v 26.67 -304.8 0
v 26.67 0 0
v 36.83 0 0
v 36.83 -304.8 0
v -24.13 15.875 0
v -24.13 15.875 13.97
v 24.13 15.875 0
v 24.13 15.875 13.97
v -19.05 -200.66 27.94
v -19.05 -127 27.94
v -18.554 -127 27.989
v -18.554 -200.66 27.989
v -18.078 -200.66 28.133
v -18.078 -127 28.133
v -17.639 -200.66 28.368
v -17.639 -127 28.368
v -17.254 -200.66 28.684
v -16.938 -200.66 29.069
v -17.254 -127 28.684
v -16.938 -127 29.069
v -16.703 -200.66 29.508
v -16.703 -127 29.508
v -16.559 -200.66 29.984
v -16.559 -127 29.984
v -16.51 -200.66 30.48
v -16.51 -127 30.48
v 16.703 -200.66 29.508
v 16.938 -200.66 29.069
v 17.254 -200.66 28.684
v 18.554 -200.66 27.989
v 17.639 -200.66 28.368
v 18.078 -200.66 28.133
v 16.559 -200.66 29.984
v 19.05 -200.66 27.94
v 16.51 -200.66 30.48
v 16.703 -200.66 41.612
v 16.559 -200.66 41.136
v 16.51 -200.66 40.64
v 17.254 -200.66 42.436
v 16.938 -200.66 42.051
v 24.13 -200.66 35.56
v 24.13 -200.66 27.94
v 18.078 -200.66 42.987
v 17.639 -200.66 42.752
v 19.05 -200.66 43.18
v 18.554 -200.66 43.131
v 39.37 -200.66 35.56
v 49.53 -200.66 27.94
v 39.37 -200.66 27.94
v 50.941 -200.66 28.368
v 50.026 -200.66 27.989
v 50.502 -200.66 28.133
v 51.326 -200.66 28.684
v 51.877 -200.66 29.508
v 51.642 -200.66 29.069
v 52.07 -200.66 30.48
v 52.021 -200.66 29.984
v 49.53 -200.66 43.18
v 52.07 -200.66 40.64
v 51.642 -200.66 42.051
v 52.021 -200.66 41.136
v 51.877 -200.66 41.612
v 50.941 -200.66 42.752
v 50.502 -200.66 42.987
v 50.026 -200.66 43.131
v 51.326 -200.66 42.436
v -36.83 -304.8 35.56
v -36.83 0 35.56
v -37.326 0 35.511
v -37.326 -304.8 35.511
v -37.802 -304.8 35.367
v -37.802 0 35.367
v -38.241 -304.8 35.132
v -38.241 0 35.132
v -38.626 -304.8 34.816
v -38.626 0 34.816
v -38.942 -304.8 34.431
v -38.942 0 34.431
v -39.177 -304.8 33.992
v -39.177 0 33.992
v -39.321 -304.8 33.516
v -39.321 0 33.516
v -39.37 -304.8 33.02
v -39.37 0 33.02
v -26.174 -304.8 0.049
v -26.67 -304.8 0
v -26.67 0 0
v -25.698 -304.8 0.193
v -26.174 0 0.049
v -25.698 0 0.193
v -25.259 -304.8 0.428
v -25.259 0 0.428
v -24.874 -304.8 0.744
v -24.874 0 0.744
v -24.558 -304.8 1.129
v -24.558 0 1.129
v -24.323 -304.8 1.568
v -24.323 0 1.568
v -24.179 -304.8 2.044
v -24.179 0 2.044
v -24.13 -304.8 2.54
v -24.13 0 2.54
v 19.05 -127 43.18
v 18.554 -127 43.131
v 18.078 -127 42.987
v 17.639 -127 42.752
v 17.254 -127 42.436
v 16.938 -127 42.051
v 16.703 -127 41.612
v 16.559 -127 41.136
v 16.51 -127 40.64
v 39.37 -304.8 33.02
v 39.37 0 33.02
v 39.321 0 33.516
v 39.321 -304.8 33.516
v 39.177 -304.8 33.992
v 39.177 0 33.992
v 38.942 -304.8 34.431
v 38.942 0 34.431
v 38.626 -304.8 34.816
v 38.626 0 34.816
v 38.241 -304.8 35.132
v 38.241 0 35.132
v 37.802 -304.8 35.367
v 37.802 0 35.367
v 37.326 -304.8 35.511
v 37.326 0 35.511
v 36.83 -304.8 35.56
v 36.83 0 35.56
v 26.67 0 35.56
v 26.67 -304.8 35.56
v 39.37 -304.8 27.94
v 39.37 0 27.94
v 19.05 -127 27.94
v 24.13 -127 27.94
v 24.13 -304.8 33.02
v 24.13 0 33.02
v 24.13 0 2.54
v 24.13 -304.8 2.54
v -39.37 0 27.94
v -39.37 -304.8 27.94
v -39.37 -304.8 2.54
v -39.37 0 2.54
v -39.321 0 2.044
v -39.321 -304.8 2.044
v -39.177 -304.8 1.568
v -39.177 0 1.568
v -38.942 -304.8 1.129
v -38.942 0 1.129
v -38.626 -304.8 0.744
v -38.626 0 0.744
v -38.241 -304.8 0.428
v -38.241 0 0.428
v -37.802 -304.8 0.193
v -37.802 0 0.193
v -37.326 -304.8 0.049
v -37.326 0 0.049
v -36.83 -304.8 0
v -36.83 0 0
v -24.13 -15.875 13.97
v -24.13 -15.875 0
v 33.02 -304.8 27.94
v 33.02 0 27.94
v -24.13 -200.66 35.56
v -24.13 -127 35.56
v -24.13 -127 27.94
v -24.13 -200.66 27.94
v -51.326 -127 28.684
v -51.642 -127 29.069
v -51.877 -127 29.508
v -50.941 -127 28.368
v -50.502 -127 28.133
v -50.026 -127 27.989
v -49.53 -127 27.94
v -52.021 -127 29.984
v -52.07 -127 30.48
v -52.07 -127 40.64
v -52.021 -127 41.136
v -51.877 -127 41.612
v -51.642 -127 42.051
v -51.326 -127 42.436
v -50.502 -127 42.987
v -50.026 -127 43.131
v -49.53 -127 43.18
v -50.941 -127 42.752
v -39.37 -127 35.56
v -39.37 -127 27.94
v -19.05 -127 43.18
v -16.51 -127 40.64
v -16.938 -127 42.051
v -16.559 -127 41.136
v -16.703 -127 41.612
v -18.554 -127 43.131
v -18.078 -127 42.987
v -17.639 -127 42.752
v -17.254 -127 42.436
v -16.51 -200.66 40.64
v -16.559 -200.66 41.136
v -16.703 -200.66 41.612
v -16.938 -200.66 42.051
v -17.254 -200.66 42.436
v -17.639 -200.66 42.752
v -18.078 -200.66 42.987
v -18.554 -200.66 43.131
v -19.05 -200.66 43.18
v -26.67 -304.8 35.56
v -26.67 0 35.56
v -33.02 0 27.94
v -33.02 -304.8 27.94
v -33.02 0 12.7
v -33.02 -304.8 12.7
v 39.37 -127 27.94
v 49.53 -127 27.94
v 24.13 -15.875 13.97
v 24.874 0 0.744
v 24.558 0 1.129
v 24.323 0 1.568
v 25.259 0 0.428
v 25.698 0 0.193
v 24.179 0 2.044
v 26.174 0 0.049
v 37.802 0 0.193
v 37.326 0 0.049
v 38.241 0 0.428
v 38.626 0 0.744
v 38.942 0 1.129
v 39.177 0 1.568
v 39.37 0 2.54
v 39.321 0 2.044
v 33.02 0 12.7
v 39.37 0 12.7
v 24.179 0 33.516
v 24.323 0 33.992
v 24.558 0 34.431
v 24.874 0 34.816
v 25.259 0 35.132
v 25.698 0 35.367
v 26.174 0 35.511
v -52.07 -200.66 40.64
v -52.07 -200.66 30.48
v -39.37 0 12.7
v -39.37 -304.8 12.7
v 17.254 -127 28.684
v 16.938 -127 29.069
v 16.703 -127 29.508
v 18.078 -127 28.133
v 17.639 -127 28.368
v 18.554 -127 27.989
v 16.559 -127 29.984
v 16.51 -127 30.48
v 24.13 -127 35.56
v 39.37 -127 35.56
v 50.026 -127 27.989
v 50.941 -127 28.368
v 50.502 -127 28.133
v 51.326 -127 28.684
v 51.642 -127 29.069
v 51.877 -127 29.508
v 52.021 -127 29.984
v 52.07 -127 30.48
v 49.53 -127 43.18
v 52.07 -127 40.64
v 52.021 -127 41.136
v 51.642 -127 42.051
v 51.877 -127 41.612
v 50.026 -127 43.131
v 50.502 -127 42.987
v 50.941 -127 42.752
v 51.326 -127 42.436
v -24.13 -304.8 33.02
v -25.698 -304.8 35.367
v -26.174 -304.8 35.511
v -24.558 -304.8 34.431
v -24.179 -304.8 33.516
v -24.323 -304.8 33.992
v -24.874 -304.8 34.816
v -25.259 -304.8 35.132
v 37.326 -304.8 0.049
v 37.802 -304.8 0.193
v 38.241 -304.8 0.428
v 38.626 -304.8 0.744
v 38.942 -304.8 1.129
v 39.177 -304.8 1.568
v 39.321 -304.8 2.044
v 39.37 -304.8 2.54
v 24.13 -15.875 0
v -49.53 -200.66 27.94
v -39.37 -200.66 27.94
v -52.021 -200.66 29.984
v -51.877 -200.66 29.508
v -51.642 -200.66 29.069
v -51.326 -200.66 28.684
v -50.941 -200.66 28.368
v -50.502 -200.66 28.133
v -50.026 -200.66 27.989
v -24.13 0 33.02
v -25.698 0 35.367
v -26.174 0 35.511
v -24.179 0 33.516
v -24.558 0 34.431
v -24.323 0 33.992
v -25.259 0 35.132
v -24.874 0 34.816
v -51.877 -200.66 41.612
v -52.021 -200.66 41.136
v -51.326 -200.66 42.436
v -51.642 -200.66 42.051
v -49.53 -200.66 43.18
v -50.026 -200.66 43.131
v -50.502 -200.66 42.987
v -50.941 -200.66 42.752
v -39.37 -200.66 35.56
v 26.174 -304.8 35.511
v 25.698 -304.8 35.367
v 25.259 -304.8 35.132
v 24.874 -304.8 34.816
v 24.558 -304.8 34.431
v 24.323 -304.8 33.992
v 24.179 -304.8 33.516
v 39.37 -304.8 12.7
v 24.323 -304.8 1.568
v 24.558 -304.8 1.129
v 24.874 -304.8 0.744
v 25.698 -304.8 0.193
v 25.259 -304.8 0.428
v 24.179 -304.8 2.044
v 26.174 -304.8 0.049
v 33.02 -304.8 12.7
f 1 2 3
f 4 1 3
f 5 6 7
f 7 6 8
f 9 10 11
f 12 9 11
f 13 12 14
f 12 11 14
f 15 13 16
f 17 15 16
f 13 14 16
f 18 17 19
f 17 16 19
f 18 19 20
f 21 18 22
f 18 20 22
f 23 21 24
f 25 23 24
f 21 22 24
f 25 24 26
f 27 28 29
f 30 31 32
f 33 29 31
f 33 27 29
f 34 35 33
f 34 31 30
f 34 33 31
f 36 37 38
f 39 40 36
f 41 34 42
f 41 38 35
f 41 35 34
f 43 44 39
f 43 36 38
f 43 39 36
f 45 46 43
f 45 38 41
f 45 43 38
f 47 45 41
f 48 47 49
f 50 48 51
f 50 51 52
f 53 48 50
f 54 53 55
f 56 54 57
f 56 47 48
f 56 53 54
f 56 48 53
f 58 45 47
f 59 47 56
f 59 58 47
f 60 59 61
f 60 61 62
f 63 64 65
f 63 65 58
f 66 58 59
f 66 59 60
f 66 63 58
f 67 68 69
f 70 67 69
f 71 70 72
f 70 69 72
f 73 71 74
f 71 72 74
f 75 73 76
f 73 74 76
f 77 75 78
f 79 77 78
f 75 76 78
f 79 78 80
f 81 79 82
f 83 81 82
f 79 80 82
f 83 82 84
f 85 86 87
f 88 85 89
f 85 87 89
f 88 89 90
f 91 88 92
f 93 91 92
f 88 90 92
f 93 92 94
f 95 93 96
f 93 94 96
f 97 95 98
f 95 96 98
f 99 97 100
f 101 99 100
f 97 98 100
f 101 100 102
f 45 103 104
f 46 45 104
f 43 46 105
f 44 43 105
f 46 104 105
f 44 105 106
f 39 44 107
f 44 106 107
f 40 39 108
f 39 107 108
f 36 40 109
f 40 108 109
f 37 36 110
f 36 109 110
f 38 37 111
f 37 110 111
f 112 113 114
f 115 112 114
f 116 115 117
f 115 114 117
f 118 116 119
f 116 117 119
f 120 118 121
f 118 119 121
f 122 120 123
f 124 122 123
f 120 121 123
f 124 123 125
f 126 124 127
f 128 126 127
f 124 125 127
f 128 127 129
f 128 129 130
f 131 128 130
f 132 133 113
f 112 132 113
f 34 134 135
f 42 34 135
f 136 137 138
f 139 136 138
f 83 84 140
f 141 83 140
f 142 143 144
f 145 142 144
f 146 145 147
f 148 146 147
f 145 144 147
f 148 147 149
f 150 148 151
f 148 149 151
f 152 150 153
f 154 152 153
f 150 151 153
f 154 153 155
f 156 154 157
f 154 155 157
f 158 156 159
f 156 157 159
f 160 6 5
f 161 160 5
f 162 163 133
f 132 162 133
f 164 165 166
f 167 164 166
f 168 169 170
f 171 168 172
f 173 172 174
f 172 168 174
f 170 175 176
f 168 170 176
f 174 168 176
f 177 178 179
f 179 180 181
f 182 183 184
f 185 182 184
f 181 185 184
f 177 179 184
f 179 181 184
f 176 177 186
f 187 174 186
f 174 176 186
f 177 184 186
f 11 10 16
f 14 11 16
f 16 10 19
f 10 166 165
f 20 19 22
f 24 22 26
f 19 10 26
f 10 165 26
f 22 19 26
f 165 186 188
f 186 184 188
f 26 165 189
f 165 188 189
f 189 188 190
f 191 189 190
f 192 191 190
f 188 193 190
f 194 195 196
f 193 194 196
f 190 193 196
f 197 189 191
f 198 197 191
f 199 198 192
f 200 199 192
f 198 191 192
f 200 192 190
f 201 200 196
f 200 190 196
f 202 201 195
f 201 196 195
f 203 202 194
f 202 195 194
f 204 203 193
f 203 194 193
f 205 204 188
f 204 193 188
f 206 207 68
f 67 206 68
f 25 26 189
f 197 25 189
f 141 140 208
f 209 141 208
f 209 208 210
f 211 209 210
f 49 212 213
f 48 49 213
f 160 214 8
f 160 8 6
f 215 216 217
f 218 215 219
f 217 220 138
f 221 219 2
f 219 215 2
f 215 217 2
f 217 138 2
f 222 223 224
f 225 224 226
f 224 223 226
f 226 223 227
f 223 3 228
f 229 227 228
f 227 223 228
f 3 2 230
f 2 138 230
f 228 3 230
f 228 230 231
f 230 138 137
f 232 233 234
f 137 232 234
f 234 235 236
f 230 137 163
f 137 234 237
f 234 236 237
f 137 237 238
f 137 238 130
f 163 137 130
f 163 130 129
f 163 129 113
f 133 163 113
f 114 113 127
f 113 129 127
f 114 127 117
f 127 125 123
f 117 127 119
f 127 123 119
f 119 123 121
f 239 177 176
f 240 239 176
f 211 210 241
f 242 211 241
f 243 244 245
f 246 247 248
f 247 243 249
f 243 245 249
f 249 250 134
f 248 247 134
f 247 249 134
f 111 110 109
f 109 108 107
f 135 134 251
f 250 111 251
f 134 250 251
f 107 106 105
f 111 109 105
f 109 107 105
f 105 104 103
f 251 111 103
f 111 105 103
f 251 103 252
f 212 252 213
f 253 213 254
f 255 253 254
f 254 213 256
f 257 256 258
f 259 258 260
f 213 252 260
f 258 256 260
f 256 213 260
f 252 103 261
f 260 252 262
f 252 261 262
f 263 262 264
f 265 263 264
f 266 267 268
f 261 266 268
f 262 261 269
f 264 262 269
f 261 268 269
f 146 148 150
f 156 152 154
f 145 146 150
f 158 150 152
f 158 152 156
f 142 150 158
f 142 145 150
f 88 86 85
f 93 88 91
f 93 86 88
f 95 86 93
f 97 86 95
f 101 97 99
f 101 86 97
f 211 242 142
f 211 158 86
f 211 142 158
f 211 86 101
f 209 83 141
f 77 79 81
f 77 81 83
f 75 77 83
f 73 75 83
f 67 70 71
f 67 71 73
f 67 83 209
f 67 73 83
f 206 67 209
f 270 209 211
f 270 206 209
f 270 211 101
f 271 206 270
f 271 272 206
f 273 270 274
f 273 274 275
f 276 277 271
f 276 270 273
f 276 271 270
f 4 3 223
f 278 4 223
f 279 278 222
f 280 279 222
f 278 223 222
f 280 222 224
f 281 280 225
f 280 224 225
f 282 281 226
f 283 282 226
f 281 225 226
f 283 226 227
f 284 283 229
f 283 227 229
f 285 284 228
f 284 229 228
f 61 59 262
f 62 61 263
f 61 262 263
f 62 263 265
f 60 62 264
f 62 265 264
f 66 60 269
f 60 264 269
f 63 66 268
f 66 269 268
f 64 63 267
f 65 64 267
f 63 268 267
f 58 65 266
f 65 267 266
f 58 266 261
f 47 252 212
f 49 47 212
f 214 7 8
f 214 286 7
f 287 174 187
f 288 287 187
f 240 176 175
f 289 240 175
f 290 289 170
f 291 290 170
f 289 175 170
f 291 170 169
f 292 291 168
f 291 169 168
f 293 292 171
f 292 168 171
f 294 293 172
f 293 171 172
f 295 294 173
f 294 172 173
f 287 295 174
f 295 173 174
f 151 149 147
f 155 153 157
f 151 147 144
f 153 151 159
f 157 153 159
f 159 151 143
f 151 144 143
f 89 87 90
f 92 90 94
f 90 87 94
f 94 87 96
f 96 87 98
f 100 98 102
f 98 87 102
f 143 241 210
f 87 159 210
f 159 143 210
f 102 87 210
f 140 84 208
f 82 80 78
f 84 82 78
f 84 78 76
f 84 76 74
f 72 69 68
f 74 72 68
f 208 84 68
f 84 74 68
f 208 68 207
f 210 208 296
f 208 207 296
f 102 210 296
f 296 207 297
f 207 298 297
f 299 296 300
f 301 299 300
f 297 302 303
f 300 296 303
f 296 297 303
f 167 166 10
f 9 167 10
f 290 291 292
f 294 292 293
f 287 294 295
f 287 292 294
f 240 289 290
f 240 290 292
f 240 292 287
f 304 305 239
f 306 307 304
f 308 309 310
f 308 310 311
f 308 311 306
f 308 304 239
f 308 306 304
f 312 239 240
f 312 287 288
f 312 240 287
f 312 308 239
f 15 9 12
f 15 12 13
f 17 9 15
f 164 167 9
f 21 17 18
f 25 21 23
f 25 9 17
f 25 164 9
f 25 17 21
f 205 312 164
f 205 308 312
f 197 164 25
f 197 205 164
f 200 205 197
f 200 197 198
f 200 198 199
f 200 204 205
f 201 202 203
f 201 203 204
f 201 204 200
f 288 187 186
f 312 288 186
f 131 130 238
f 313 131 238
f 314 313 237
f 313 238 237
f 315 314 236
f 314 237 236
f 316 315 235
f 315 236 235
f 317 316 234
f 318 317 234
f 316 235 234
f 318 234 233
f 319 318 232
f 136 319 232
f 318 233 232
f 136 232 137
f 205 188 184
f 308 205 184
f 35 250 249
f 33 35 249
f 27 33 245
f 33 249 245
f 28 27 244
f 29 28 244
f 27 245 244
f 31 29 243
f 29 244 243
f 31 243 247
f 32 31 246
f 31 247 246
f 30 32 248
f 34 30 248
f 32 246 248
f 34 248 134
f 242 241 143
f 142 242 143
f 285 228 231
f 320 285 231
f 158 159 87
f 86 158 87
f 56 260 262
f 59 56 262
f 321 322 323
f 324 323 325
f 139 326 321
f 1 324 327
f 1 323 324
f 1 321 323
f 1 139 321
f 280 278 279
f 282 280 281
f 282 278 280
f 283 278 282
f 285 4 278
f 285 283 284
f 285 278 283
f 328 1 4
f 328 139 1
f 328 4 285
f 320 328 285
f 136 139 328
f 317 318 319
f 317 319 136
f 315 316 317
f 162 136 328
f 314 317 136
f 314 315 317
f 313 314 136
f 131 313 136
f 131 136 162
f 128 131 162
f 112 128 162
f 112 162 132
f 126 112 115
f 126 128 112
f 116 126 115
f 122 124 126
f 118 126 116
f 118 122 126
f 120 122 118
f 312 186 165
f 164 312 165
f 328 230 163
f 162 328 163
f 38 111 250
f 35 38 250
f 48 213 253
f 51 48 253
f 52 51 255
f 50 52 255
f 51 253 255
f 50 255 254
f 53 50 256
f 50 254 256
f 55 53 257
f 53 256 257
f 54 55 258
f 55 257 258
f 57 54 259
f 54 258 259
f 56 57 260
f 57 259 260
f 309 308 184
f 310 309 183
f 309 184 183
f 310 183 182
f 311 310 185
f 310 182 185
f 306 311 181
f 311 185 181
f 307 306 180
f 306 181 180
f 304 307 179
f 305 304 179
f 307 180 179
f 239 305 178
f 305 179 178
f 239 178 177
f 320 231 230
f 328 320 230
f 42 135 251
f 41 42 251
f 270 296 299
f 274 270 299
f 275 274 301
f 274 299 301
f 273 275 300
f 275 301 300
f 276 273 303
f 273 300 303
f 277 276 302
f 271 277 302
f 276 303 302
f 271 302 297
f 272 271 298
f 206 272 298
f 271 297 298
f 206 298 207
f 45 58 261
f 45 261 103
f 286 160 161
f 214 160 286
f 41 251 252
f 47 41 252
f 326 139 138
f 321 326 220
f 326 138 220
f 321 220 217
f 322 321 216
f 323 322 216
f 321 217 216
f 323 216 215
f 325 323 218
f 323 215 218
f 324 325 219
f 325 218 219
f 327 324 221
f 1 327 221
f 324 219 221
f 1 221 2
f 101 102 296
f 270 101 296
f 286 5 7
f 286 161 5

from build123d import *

# Parameters (mm, degrees)
F1_DEPTH      = 304.8
F2_START      = 127
F2_DEPTH      = 73.66
F4_DEPTH      = 15.875
F4_DEPTH_BACK = 15.875


with BuildPart() as f1:
    # F0 (on Front) → F1 (new body)
    with BuildSketch(Plane.XZ):
        with BuildLine():
            Line((-24.13, 2.54), (-24.13, 13.97))
            Line((-24.13, 13.97), (-24.13, 27.94))
            Line((-24.13, 27.94), (-24.13, 33.02))
            ThreePointArc((-24.13, 33.02), (-24.8739487758, 34.8160512242), (-26.67, 35.56))
            Line((-26.67, 35.56), (-36.83, 35.56))
            ThreePointArc((-36.83, 35.56), (-38.6260512242, 34.8160512242), (-39.37, 33.02))
            Line((-39.37, 33.02), (-39.37, 27.94))
            Line((-39.37, 27.94), (-33.02, 27.94))
            Line((-33.02, 27.94), (-33.02, 12.7))
            Line((-33.02, 12.7), (-39.37, 12.7))
            Line((-39.37, 12.7), (-39.37, 2.54))
            ThreePointArc((-39.37, 2.54), (-38.6260512242, 0.7439487758), (-36.83, 0))
            Line((-36.83, 0), (-26.67, 0))
            ThreePointArc((-26.67, 0), (-24.8739487758, 0.7439487758), (-24.13, 2.54))
        make_face()
    extrude(amount=F1_DEPTH)


with BuildPart() as f1b:
    # F0 (on Front) → F1, piece 2 (new body)
    with BuildSketch(Plane.XZ):
        with BuildLine():
            Line((24.13, 13.97), (24.13, 2.54))
            ThreePointArc((24.13, 2.54), (24.8739487758, 0.7439487758), (26.67, 0))
            Line((26.67, 0), (36.83, 0))
            ThreePointArc((36.83, 0), (38.6260512242, 0.7439487758), (39.37, 2.54))
            Line((39.37, 2.54), (39.37, 12.7))
            Line((39.37, 12.7), (33.02, 12.7))
            Line((33.02, 12.7), (33.02, 27.94))
            Line((33.02, 27.94), (39.37, 27.94))
            Line((39.37, 27.94), (39.37, 33.02))
            ThreePointArc((39.37, 33.02), (38.6260512242, 34.8160512242), (36.83, 35.56))
            Line((36.83, 35.56), (26.67, 35.56))
            ThreePointArc((26.67, 35.56), (24.8739487758, 34.8160512242), (24.13, 33.02))
            Line((24.13, 33.02), (24.13, 27.94))
            Line((24.13, 27.94), (24.13, 13.97))
        make_face()
    extrude(amount=F1_DEPTH)


with BuildPart() as f2:
    # F0 (on Front) → F2 (new body)
    with BuildSketch(Plane.XZ.offset(F2_START)):
        with BuildLine():
            Line((-24.13, 33.02), (-24.13, 27.94))
            Line((-24.13, 27.94), (-19.05, 27.94))
            ThreePointArc((-19.05, 27.94), (-17.2539487758, 28.6839487758), (-16.51, 30.48))
            Line((-16.51, 30.48), (-16.51, 40.64))
            ThreePointArc((-16.51, 40.64), (-17.2539487758, 42.4360512242), (-19.05, 43.18))
            Line((-19.05, 43.18), (-49.53, 43.18))
            ThreePointArc((-49.53, 43.18), (-51.3260512242, 42.4360512242), (-52.07, 40.64))
            Line((-52.07, 40.64), (-52.07, 30.48))
            ThreePointArc((-52.07, 30.48), (-51.3260512242, 28.6839487758), (-49.53, 27.94))
            Line((-49.53, 27.94), (-39.37, 27.94))
            Line((-39.37, 27.94), (-39.37, 33.02))
            Line((-39.37, 33.02), (-39.37, 35.56))
            Line((-39.37, 35.56), (-36.83, 35.56))
            Line((-36.83, 35.56), (-26.67, 35.56))
            Line((-26.67, 35.56), (-24.13, 35.56))
            Line((-24.13, 35.56), (-24.13, 33.02))
        make_face()
    extrude(amount=F2_DEPTH)


with BuildPart() as f2b:
    # F0 (on Front) → F2, piece 2 (new body)
    with BuildSketch(Plane.XZ.offset(F2_START)):
        with BuildLine():
            Line((19.05, 27.94), (24.13, 27.94))
            Line((24.13, 27.94), (24.13, 33.02))
            Line((24.13, 33.02), (24.13, 35.56))
            Line((24.13, 35.56), (26.67, 35.56))
            Line((26.67, 35.56), (36.83, 35.56))
            Line((36.83, 35.56), (39.37, 35.56))
            Line((39.37, 35.56), (39.37, 33.02))
            Line((39.37, 33.02), (39.37, 27.94))
            Line((39.37, 27.94), (49.53, 27.94))
            ThreePointArc((49.53, 27.94), (51.3260512242, 28.6839487758), (52.07, 30.48))
            Line((52.07, 30.48), (52.07, 40.64))
            ThreePointArc((52.07, 40.64), (51.3260512242, 42.4360512242), (49.53, 43.18))
            Line((49.53, 43.18), (19.05, 43.18))
            ThreePointArc((19.05, 43.18), (17.2539487758, 42.4360512242), (16.51, 40.64))
            Line((16.51, 40.64), (16.51, 30.48))
            ThreePointArc((16.51, 30.48), (17.2539487758, 28.6839487758), (19.05, 27.94))
        make_face()
    extrude(amount=F2_DEPTH)


with BuildPart() as f4:
    # F0 (on Front) → F4 (new body, two sides)
    with BuildSketch(Plane.XZ) as f4_sk:
        Polygon((24.13, 0), (24.13, 2.54), (24.13, 13.97), (-24.13, 13.97), (-24.13, 2.54), (-24.13, 0), align=None)
    extrude(amount=F4_DEPTH)
    extrude(f4_sk.sketch, amount=-F4_DEPTH_BACK)


solid = Compound([f1.part, f1b.part, f2.part, f2b.part, f4.part])
